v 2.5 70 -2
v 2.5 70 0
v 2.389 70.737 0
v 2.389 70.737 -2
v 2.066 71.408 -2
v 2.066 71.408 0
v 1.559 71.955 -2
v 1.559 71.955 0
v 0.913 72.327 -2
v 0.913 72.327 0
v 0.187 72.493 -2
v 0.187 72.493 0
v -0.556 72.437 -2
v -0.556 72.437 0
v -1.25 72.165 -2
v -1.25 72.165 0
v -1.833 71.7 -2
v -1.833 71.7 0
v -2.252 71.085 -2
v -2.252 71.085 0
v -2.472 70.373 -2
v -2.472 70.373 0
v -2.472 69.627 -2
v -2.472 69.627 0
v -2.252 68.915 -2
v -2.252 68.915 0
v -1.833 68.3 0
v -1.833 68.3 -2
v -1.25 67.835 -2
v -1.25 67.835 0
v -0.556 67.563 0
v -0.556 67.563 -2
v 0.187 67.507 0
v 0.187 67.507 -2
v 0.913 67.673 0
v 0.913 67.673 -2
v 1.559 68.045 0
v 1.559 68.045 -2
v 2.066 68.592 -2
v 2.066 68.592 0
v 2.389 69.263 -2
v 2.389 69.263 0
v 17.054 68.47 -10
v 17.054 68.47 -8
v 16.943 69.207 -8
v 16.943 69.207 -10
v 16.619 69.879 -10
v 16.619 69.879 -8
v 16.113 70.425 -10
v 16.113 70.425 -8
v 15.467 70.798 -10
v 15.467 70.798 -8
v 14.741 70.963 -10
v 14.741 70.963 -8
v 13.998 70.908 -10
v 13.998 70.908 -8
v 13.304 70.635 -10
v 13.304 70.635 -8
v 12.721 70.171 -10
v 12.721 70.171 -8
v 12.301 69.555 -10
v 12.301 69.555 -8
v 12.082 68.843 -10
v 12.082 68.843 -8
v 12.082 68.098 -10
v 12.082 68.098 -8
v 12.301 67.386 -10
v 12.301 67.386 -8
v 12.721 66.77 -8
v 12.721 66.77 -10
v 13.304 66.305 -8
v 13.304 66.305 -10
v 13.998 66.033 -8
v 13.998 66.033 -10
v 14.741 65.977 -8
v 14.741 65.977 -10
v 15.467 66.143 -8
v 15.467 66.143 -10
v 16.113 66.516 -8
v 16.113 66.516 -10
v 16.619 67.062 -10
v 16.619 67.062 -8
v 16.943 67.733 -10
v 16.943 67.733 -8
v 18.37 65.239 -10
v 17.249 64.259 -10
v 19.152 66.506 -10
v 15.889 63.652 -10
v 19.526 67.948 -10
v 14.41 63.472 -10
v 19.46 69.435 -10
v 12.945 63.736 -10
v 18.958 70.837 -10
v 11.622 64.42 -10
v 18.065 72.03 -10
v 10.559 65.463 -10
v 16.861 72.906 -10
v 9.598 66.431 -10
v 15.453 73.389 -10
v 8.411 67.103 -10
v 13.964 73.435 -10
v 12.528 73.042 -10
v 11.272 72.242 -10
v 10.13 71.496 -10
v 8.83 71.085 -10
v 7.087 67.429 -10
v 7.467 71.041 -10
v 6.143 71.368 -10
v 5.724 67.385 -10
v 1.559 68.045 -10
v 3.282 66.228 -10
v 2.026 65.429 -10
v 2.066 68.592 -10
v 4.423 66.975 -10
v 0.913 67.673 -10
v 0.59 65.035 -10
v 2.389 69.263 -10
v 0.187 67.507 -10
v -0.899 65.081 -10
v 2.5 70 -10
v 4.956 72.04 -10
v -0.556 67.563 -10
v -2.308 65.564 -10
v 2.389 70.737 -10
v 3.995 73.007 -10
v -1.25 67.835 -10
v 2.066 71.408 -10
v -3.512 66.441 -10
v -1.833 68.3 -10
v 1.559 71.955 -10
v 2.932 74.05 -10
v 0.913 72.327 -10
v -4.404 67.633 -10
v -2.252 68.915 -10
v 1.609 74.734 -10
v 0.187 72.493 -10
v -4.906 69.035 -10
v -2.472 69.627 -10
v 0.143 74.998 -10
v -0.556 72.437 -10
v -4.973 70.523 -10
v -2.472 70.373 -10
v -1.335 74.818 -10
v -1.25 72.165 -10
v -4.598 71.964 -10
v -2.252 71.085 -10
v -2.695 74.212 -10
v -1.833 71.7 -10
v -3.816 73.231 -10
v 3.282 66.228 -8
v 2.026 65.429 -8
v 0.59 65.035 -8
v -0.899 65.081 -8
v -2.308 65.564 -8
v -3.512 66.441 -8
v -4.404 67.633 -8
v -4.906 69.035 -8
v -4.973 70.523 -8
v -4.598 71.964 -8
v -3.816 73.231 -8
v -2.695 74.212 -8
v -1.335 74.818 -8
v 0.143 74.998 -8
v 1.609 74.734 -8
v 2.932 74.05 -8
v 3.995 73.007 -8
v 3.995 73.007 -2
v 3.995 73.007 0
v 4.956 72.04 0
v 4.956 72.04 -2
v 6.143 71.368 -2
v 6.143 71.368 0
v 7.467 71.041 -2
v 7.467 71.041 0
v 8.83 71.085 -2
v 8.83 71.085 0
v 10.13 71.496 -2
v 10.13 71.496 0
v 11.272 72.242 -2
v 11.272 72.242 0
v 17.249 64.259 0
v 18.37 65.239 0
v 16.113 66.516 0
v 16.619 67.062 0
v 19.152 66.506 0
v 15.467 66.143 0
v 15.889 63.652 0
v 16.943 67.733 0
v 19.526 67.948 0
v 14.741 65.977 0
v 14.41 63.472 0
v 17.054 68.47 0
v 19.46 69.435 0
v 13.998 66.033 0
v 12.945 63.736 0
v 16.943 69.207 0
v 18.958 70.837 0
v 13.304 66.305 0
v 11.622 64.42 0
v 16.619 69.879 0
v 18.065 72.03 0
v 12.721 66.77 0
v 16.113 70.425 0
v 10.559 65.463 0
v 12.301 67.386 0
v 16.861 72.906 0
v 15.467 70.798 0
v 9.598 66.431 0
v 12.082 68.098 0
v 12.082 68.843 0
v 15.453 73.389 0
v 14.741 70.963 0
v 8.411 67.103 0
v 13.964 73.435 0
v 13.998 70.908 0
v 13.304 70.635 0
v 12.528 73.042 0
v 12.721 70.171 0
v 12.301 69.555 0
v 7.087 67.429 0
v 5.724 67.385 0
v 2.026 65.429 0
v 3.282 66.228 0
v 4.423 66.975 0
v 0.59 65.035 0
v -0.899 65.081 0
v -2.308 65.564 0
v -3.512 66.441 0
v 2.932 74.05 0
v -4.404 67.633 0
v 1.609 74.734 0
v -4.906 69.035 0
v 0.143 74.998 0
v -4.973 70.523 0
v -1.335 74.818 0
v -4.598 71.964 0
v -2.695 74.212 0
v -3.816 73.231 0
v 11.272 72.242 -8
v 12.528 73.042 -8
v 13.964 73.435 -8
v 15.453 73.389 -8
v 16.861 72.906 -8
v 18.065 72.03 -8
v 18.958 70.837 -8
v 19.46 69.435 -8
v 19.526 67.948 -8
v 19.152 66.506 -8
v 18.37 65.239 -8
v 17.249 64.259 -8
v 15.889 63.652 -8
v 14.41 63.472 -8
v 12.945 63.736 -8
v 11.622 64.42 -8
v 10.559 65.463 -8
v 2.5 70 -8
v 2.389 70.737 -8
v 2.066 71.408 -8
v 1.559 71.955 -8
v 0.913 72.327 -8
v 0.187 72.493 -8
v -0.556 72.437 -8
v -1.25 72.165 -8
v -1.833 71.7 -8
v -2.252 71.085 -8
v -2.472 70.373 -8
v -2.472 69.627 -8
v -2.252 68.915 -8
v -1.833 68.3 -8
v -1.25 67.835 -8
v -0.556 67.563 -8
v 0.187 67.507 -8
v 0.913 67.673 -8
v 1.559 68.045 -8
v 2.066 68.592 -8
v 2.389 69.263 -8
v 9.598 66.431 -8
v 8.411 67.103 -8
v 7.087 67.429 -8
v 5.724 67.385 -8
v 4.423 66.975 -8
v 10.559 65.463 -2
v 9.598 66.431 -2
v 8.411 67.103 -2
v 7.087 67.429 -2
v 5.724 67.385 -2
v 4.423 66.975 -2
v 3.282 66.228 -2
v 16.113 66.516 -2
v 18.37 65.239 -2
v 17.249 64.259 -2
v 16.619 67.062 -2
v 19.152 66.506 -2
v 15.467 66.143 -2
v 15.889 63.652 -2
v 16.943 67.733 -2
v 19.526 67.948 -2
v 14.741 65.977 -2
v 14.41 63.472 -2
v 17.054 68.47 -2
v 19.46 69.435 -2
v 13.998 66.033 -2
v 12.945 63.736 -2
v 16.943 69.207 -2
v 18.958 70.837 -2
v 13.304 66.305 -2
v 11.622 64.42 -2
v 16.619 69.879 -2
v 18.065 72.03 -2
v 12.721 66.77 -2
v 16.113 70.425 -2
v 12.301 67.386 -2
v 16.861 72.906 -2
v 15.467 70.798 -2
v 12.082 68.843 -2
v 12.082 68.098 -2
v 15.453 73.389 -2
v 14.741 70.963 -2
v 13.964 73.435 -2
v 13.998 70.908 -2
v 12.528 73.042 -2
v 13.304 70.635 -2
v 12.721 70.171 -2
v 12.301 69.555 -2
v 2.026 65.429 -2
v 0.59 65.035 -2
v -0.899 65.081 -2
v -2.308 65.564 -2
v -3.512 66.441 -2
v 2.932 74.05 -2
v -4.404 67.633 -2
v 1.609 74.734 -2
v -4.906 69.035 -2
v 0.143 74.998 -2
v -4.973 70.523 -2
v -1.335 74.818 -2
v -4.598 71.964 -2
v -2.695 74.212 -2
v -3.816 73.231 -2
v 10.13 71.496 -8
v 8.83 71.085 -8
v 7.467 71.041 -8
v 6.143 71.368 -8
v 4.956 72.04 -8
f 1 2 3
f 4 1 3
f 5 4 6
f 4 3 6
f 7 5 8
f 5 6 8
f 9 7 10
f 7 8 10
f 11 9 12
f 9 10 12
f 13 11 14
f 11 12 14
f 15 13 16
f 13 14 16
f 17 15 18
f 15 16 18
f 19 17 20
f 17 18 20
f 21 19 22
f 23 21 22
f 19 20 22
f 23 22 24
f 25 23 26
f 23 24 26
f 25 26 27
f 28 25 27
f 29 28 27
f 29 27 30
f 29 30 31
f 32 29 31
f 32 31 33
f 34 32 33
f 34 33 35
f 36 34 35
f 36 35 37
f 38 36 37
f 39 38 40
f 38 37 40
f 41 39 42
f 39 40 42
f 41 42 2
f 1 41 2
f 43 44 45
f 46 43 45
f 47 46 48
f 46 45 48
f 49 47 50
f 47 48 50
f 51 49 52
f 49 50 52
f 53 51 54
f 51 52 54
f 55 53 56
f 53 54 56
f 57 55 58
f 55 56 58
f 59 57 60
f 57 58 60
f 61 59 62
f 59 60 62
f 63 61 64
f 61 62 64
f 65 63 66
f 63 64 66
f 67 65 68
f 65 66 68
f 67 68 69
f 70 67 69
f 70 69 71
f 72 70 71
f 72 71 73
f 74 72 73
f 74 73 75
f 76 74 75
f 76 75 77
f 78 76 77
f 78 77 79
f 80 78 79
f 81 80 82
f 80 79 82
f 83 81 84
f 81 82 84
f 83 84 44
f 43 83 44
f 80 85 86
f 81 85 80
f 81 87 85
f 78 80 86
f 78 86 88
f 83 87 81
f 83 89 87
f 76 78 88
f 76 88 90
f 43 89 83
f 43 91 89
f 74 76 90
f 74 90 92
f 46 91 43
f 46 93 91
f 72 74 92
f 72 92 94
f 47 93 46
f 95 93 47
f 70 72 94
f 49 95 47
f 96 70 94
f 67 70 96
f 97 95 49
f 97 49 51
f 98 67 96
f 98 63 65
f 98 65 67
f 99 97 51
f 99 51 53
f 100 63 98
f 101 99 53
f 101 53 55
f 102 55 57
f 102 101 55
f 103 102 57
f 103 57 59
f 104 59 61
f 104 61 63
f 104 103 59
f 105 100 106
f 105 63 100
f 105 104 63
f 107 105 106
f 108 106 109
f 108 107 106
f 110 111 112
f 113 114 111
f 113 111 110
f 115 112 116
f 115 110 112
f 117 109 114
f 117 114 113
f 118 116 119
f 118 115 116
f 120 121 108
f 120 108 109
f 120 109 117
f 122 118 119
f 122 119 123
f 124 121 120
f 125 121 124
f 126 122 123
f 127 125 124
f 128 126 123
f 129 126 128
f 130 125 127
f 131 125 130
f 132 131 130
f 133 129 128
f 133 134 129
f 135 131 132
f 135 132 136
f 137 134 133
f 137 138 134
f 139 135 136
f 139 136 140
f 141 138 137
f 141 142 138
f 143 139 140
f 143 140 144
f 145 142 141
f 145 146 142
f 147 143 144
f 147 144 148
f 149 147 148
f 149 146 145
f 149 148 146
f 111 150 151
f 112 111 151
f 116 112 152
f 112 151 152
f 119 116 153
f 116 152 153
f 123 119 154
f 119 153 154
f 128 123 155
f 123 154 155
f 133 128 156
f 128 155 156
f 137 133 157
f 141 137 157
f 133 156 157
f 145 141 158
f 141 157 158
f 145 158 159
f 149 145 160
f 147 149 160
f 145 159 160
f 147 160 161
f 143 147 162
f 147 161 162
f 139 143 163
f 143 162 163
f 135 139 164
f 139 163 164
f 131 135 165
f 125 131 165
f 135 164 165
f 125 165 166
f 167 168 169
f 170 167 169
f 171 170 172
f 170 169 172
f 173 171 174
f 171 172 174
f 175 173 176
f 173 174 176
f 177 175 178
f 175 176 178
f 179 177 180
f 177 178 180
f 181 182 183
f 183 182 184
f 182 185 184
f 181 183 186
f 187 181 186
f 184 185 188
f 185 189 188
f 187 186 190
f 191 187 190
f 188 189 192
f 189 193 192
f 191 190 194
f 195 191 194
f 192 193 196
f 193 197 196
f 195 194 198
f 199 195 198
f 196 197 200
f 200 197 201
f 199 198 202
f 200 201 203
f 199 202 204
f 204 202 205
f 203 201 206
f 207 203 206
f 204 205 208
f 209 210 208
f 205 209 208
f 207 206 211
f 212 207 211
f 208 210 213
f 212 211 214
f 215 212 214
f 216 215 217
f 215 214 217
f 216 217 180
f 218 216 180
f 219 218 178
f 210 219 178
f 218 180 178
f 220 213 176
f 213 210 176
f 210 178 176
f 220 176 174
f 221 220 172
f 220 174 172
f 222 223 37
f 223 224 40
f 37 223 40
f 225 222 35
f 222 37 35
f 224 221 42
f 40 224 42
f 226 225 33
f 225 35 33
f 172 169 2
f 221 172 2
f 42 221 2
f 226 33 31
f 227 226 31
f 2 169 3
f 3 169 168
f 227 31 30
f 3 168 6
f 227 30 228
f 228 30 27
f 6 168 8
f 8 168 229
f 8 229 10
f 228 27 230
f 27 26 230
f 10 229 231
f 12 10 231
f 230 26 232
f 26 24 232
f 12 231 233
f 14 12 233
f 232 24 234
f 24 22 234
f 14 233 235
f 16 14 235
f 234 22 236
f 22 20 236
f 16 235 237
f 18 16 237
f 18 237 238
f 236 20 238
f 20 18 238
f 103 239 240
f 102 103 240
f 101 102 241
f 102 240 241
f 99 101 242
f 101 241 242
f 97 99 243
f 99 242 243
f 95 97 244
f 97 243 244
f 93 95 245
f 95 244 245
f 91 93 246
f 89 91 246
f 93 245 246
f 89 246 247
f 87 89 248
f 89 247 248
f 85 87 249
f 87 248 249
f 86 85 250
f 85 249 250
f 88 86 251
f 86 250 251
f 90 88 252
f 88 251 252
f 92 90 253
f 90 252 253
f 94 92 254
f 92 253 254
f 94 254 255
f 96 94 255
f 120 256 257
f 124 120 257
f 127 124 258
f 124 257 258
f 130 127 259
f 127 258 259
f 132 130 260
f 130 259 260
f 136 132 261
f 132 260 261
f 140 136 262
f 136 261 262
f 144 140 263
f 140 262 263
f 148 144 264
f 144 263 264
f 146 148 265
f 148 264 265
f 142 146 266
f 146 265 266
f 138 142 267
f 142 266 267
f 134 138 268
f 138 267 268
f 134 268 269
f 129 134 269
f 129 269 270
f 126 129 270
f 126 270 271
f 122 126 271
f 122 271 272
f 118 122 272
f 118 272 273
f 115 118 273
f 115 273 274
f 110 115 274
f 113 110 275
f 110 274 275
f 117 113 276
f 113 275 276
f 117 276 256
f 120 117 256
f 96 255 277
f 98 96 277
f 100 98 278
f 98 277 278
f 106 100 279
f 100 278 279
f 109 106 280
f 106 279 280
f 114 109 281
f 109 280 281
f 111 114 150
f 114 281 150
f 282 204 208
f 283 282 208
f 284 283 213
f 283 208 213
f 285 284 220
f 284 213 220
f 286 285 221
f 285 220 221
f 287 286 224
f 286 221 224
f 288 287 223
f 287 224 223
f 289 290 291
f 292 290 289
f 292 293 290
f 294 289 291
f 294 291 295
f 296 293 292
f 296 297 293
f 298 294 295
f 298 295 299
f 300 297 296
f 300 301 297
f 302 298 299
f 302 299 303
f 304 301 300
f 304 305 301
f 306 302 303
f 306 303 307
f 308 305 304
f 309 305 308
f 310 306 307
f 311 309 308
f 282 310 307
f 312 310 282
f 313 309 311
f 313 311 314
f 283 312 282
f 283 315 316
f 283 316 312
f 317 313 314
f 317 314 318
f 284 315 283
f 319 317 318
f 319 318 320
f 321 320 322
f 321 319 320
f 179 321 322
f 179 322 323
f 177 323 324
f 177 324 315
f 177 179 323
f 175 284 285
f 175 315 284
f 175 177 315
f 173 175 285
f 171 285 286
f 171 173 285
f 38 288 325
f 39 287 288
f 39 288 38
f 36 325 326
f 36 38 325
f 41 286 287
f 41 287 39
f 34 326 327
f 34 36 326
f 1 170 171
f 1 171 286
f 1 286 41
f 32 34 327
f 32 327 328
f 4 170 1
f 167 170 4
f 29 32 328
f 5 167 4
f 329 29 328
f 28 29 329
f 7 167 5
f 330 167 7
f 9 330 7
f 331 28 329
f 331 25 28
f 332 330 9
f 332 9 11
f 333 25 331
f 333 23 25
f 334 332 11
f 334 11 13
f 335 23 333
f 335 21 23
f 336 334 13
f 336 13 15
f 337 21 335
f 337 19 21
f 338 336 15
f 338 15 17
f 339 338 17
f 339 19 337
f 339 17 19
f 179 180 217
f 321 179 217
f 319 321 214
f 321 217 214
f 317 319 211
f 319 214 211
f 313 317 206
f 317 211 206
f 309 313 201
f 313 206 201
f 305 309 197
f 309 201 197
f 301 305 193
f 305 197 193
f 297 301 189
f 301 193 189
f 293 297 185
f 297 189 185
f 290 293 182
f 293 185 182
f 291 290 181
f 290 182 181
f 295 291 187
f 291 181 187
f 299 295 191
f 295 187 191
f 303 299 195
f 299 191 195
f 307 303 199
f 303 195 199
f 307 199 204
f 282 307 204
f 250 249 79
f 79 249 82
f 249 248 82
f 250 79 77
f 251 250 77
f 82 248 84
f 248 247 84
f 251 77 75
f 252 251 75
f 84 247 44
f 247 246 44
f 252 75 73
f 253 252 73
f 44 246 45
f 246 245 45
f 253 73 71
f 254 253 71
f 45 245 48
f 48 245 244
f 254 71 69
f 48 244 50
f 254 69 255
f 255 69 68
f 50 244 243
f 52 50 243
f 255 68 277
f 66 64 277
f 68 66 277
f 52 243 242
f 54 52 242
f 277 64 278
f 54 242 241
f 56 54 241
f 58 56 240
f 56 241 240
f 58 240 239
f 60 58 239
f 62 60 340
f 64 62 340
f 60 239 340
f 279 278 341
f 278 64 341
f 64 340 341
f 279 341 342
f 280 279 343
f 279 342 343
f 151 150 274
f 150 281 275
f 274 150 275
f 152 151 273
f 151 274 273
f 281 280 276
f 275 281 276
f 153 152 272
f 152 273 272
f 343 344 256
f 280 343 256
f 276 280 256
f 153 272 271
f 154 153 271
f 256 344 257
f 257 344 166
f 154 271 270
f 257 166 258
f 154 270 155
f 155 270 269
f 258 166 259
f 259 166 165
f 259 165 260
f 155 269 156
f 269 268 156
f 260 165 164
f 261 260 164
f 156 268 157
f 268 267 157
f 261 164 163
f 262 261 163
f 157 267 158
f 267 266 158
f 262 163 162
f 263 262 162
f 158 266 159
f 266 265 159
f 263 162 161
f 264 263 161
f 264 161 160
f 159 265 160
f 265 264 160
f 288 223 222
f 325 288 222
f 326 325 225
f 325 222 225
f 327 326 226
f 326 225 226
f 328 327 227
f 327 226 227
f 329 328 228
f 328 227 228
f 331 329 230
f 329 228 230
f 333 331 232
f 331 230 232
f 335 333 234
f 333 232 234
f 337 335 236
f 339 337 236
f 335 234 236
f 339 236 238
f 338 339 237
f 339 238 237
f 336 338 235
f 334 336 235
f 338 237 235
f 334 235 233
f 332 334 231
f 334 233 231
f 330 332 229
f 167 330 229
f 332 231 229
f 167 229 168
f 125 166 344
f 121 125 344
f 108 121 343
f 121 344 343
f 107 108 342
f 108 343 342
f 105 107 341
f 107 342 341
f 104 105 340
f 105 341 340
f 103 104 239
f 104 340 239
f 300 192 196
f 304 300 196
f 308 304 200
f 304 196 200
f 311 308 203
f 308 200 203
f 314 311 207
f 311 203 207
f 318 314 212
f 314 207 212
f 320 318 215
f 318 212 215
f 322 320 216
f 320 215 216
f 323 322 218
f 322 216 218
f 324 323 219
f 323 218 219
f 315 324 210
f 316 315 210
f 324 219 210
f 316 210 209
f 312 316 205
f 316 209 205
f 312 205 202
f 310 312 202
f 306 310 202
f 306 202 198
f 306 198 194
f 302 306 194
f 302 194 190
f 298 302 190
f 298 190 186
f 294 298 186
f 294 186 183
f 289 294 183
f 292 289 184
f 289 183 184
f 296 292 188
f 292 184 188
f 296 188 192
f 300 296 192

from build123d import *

# Parameters (mm, degrees)
IZIM2_R                     = 2.5
Y_KSEKLIK_EKSTR_ZYON1_DEPTH = 2
Y_KSEKLIK_EKSTR_ZYON2_START = -8
IZIM2_2_R                   = 2.5
Y_KSEKLIK_EKSTR_ZYON2_DEPTH = 2


with BuildPart() as part:
    # Çizim2 → Yükseklik-Ekstrüzyon1 (new body)
    with BuildSketch(Plane.XY):
        with BuildLine():
            ThreePointArc((10.559116328, 65.463281055), (7.087056614, 67.428839536), (3.282207149, 66.228115029))
            ThreePointArc((3.282207149, 66.228115029), (-4.972609477, 70.522642316), (3.99470203, 73.007050996))
            ThreePointArc((3.99470203, 73.007050996), (7.466761743, 71.041492516), (11.271611208, 72.242217022))
            ThreePointArc((11.271611208, 72.242217022), (19.526427834, 67.947689735), (10.559116328, 65.463281055))
        make_face()
        with Locations((0, 70)):
            Circle(IZIM2_R, mode=Mode.SUBTRACT)
        with Locations((14.553818357, 68.470332051)):
            Circle(IZIM2_R, mode=Mode.SUBTRACT)
    extrude(amount=-Y_KSEKLIK_EKSTR_ZYON1_DEPTH)


with BuildPart() as body_2:
    # Çizim2<2> → Yükseklik-Ekstrüzyon2 (new body)
    with BuildSketch(Plane.XY.offset(Y_KSEKLIK_EKSTR_ZYON2_START)):
        with BuildLine():
            ThreePointArc((10.559116328, 65.463281055), (7.087056614, 67.428839536), (3.282207149, 66.228115029))
            ThreePointArc((3.282207149, 66.228115029), (-4.972609477, 70.522642316), (3.99470203, 73.007050996))
            ThreePointArc((3.99470203, 73.007050996), (7.466761743, 71.041492516), (11.271611208, 72.242217022))
            ThreePointArc((11.271611208, 72.242217022), (19.526427834, 67.947689735), (10.559116328, 65.463281055))
        make_face()
        with Locations((0, 70)):
            Circle(IZIM2_2_R, mode=Mode.SUBTRACT)
        with Locations((14.553818357, 68.470332051)):
            Circle(IZIM2_2_R, mode=Mode.SUBTRACT)
    extrude(amount=-Y_KSEKLIK_EKSTR_ZYON2_DEPTH)


solid = Compound([part.part, body_2.part])
